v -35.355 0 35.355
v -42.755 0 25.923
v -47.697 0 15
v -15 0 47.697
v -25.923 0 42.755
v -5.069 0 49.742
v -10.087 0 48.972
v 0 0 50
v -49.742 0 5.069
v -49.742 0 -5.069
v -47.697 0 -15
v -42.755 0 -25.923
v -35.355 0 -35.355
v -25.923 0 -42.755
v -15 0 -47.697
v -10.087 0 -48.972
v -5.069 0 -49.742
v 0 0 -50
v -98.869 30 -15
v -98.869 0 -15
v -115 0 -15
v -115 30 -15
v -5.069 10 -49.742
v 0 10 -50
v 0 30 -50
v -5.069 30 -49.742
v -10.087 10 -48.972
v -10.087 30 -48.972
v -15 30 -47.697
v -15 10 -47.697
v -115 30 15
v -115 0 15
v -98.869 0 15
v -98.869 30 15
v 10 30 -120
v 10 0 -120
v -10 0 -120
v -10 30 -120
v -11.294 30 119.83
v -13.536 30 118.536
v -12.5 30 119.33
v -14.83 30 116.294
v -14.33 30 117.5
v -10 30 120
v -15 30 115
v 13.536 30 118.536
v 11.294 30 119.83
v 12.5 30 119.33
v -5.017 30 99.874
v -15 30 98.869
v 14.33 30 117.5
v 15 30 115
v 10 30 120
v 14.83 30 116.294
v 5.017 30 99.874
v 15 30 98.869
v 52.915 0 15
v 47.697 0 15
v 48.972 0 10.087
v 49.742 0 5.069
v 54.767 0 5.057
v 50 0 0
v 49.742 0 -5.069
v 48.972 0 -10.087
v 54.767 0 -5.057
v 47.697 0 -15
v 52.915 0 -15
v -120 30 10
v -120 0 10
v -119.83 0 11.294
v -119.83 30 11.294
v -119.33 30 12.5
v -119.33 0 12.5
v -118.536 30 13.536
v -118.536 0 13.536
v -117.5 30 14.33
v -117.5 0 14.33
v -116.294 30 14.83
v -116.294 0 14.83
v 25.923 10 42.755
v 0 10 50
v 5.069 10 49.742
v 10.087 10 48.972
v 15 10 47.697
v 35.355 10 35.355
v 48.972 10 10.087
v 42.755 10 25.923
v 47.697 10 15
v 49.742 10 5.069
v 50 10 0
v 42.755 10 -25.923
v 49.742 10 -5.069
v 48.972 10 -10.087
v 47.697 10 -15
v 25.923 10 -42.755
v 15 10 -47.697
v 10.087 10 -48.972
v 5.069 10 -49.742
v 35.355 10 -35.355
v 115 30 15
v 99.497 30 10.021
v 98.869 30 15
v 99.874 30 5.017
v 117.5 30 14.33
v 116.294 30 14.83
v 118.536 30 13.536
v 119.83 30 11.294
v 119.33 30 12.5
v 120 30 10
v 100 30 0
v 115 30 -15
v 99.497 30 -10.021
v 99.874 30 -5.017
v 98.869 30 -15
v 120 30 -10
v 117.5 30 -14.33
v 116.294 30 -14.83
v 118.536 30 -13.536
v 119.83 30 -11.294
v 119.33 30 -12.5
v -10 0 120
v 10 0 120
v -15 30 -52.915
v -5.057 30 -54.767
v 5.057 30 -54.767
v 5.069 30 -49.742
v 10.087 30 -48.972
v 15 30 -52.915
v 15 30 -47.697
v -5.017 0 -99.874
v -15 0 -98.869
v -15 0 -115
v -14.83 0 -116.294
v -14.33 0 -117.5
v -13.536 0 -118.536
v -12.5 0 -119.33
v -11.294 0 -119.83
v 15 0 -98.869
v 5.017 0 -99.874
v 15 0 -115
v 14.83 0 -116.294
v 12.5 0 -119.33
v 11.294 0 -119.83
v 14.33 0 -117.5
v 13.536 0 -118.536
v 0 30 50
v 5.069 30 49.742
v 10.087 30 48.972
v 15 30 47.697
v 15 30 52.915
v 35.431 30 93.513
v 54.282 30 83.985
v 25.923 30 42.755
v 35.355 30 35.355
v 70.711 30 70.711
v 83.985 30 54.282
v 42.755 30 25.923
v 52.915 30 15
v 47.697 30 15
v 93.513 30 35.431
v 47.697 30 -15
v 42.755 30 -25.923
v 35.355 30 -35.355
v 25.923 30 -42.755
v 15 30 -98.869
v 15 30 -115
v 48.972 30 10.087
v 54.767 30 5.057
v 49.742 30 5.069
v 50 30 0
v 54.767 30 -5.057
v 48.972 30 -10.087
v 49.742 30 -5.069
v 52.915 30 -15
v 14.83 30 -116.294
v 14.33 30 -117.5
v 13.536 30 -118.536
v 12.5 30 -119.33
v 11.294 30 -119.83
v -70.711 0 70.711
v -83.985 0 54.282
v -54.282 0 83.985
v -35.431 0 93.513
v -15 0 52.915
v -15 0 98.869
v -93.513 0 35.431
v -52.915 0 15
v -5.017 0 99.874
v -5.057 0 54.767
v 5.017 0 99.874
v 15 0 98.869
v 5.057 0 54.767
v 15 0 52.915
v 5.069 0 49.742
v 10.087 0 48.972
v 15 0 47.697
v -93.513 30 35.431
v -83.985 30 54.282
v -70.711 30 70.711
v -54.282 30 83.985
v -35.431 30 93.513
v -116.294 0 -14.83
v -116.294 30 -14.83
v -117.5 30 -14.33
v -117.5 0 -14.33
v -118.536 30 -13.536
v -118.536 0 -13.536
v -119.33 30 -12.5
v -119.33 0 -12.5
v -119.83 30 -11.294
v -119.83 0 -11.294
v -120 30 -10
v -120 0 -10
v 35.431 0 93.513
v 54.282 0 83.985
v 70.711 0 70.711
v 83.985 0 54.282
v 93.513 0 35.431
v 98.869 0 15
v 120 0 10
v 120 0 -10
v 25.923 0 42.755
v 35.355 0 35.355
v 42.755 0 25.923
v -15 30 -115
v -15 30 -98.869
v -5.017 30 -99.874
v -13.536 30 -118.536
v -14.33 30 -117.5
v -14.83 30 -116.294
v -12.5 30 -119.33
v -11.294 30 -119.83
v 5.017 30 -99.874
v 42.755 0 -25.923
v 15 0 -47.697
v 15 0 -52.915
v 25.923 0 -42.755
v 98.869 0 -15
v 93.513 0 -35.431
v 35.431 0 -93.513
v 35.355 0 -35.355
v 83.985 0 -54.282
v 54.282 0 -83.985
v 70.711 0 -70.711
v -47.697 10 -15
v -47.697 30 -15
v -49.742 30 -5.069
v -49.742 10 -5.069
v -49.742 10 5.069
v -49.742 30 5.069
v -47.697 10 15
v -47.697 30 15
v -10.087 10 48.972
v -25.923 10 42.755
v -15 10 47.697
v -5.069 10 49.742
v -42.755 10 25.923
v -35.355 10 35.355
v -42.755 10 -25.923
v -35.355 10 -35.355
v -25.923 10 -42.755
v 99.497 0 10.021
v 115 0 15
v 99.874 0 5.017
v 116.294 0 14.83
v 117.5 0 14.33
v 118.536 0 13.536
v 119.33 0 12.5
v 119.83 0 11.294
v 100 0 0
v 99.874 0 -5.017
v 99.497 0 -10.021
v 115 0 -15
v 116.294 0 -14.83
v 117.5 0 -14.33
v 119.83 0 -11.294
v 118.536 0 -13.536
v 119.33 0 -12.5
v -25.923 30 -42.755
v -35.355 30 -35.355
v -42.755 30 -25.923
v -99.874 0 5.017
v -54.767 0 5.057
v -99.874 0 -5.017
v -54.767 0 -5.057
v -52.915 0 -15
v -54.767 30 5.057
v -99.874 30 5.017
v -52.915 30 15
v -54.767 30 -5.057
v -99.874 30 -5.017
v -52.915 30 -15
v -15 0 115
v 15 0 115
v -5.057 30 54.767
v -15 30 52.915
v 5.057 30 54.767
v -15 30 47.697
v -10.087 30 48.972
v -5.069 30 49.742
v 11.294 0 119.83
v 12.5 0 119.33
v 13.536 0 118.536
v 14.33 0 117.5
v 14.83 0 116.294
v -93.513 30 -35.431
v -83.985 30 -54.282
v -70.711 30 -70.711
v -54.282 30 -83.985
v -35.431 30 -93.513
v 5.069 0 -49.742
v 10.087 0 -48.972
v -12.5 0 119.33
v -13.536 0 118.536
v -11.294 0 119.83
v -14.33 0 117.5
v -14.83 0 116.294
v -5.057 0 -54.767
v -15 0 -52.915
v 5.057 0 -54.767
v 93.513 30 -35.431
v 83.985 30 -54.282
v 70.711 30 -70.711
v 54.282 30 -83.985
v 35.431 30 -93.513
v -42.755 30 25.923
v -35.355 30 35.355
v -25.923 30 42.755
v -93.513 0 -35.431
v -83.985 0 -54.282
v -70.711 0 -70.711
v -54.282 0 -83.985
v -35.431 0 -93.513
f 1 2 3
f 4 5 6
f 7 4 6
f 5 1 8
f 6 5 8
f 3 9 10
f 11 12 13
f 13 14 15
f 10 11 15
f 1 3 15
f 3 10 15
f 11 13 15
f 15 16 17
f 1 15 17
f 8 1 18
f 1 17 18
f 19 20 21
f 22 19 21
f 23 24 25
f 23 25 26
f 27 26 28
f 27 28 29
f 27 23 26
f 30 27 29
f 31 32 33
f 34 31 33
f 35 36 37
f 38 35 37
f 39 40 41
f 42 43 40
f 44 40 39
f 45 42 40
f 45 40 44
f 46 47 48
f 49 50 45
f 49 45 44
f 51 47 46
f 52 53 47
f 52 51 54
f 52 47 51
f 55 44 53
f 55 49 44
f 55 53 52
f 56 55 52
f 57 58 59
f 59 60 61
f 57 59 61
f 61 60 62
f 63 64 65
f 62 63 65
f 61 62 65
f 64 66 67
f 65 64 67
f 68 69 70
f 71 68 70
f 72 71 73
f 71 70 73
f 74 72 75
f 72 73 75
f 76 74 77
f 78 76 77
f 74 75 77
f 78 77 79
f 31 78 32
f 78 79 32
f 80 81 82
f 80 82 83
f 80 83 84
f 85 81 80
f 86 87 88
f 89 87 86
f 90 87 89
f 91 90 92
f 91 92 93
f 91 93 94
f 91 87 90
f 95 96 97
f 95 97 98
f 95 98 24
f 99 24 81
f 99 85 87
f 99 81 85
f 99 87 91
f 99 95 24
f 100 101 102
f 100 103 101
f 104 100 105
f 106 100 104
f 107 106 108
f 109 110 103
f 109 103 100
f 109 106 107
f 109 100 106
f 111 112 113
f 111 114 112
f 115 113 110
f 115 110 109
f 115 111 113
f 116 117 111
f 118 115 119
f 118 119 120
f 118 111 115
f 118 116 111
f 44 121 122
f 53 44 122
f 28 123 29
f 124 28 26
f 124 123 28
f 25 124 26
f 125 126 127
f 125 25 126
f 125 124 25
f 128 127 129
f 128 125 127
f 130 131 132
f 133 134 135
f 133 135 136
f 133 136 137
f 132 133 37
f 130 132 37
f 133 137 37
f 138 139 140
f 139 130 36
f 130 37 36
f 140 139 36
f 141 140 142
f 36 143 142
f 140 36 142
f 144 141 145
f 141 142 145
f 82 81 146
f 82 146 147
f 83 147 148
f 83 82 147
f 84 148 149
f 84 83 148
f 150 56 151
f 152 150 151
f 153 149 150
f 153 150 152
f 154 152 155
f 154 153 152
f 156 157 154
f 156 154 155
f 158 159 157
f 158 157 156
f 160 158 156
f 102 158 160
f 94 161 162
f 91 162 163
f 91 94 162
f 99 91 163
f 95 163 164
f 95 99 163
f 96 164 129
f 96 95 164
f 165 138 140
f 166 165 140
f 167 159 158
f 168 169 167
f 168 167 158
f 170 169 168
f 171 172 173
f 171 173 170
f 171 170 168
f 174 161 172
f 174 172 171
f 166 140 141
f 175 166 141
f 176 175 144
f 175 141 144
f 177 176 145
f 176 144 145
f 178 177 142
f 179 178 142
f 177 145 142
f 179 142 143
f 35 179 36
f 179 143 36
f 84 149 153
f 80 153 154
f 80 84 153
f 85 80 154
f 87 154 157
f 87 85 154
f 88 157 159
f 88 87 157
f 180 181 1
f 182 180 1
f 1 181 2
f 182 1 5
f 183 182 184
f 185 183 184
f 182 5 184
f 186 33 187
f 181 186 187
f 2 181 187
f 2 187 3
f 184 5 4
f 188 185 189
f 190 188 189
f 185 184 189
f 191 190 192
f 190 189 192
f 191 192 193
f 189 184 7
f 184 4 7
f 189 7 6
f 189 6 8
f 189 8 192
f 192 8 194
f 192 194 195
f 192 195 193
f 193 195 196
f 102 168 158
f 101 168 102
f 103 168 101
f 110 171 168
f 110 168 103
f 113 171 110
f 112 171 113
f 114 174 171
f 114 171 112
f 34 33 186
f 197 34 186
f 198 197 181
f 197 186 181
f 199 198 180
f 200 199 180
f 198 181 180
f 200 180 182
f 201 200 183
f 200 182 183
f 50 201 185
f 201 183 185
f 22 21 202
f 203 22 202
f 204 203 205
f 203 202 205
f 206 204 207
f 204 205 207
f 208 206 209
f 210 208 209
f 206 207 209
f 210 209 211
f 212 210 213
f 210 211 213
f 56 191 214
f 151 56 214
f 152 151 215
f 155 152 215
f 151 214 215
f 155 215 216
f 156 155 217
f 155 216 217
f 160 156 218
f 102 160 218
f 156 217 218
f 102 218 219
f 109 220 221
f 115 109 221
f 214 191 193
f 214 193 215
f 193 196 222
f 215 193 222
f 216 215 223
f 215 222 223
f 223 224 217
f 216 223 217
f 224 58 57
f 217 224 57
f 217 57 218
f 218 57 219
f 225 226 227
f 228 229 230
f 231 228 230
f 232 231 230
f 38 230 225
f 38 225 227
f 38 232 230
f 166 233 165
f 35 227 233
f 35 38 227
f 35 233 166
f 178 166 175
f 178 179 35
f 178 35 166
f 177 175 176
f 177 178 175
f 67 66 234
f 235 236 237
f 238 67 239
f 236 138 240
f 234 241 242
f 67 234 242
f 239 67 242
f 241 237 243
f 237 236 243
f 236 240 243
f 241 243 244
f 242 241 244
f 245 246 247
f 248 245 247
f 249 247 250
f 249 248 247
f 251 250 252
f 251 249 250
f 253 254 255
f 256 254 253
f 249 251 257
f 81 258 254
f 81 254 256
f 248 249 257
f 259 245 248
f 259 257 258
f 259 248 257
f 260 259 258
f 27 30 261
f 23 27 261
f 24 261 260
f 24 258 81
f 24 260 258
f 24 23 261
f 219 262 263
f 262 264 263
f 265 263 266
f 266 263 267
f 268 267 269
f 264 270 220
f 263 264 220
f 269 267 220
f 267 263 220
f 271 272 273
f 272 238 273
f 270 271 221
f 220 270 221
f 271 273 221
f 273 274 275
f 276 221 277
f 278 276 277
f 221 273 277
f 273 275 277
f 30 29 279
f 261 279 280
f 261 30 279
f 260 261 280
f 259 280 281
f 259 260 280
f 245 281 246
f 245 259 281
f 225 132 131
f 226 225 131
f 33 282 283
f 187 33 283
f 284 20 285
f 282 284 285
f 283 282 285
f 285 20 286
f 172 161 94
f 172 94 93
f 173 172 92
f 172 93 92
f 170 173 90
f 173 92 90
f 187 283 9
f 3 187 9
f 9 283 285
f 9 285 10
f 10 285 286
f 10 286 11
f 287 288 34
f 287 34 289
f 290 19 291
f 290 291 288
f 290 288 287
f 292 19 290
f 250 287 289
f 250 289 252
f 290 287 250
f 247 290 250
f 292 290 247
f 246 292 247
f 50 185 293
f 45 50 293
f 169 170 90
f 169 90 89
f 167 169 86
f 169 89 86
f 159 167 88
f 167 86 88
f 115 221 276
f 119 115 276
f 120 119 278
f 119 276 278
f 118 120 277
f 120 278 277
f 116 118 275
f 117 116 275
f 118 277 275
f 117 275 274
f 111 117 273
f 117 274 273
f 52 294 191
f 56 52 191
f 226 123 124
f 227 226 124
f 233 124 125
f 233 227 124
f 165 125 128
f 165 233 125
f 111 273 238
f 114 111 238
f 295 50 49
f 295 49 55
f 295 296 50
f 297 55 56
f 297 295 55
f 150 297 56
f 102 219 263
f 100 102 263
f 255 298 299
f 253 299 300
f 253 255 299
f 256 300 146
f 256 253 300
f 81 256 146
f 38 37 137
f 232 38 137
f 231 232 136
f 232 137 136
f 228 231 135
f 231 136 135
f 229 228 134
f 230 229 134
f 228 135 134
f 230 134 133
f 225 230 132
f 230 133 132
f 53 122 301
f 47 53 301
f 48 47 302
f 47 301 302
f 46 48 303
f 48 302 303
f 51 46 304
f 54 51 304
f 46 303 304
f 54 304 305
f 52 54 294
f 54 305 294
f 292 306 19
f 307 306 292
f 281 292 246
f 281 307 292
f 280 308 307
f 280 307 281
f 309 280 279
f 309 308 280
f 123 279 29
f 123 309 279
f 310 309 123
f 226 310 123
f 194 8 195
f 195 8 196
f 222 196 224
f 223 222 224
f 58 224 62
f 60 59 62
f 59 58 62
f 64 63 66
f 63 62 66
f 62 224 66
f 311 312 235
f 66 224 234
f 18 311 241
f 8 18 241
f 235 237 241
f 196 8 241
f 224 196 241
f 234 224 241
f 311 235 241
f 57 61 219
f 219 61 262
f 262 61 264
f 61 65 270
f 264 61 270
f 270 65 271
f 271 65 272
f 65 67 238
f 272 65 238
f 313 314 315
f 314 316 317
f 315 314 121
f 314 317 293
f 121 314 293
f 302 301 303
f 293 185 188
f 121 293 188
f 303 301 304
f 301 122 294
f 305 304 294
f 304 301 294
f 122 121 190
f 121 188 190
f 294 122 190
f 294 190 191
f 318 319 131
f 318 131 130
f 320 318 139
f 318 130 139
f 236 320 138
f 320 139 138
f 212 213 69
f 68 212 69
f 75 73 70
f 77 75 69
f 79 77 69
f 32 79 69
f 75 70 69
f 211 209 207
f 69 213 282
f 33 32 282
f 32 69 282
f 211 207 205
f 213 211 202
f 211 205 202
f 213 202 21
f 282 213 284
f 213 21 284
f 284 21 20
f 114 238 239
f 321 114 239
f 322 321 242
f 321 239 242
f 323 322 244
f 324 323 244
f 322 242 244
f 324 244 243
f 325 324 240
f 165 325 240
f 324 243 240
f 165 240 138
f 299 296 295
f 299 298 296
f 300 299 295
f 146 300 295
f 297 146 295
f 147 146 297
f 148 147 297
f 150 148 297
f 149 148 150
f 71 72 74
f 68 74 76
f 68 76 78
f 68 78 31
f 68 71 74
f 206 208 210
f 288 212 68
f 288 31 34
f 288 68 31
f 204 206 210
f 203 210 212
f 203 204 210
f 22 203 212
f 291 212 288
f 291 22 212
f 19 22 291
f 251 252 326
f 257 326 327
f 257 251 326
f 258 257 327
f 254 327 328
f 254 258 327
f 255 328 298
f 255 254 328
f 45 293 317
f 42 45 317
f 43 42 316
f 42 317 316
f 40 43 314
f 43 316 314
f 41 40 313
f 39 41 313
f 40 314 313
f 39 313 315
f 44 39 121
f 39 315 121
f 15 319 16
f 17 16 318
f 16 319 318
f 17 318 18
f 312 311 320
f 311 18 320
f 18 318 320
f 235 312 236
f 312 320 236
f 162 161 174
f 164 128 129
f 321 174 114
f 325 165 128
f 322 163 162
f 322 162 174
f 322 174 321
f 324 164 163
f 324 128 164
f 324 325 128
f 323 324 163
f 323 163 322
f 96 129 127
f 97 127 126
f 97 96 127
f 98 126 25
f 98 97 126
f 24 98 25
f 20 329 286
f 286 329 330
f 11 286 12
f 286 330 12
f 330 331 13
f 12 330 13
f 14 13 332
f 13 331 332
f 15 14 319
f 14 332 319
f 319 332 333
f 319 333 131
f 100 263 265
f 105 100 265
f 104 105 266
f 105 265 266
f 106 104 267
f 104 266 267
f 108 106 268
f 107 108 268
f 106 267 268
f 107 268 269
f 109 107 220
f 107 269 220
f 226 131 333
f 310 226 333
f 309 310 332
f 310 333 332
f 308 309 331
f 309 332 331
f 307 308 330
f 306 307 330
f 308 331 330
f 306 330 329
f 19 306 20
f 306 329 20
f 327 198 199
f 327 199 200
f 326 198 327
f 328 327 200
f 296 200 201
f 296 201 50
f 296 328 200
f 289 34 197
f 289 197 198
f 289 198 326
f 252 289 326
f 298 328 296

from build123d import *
from build123d.topology import SkipClean

# Parameters (mm, degrees)
SKETCH1_R           = 100
SKETCH1_R_2         = 50
BOSS_EXTRUDE3_DEPTH = 30
BOSS_EXTRUDE4_DEPTH = 10


with BuildPart() as part:
    # Sketch1 → Boss-Extrude3 (new body)
    # profile 1 of 16: a face of its own
    with SkipClean():  # the faces are left unmerged after this step: merging them gives an invalid solid
        with BuildSketch(Plane(origin=(0, 0, 0), x_dir=(1, 0, 0), z_dir=(0, 1, 0))):
            Circle(SKETCH1_R)
            with Locations(Location((0, 0, 0), (0, 0, 270))):
                Circle(SKETCH1_R_2, mode=Mode.SUBTRACT)
        # profile 2 of 16: a face of its own
        with BuildSketch(Plane(origin=(0, 0, 0), x_dir=(1, 0, 0), z_dir=(0, 1, 0))):
            with BuildLine():
                ThreePointArc((-15, 52.915026221), (0, 55), (15, 52.915026221))
                Line((15, 52.915026221), (15, 98.868599666))
                ThreePointArc((15, 98.868599666), (0, 100), (-15, 98.868599666))
                Line((-15, 98.868599666), (-15, 52.915026221))
            make_face()
        # profile 3 of 16: a face of its own
        with BuildSketch(Plane(origin=(0, 0, 0), x_dir=(1, 0, 0), z_dir=(0, 1, 0))):
            with BuildLine():
                ThreePointArc((-15, 47.696960071), (-7.587884964, 49.420886291), (0, 50))
                ThreePointArc((0, 50), (7.587884964, 49.420886291), (15, 47.696960071))
                Line((15, 47.696960071), (15, 52.915026221))
                ThreePointArc((15, 52.915026221), (0, 55), (-15, 52.915026221))
                Line((-15, 52.915026221), (-15, 47.696960071))
            make_face()
        # profile 4 of 16: a face of its own
        with BuildSketch(Plane(origin=(0, 0, 0), x_dir=(1, 0, 0), z_dir=(0, 1, 0))):
            with BuildLine():
                ThreePointArc((-15, 98.868599666), (0, 100), (15, 98.868599666))
                Line((15, 98.868599666), (15, 115))
                ThreePointArc((15, 115), (13.535533906, 118.535533906), (10, 120))
                Line((10, 120), (-10, 120))
                ThreePointArc((-10, 120), (-13.535533906, 118.535533906), (-15, 115))
                Line((-15, 115), (-15, 98.868599666))
            make_face()
        # profile 5 of 16: a face of its own
        with BuildSketch(Plane(origin=(0, 0, 0), x_dir=(1, 0, 0), z_dir=(0, 1, 0))):
            with BuildLine():
                ThreePointArc((-98.868599666, -15), (-100, 0), (-98.868599666, 15))
                Line((-98.868599666, 15), (-115, 15))
                ThreePointArc((-115, 15), (-118.535533906, 13.535533906), (-120, 10))
                Line((-120, 10), (-120, -10))
                ThreePointArc((-120, -10), (-118.535533906, -13.535533906), (-115, -15))
                Line((-115, -15), (-98.868599666, -15))
            make_face()
        # profile 6 of 16: a face of its own
        with BuildSketch(Plane(origin=(0, 0, 0), x_dir=(1, 0, 0), z_dir=(0, 1, 0))):
            with BuildLine():
                ThreePointArc((-52.915026221, -15), (-55, 0), (-52.915026221, 15))
                Line((-52.915026221, 15), (-98.868599666, 15))
                ThreePointArc((-98.868599666, 15), (-100, 0), (-98.868599666, -15))
                Line((-98.868599666, -15), (-52.915026221, -15))
            make_face()
        # profile 7 of 16: a face of its own
        with BuildSketch(Plane(origin=(0, 0, 0), x_dir=(1, 0, 0), z_dir=(0, 1, 0))):
            with BuildLine():
                ThreePointArc((-47.696960071, 15), (-35.355339059, 35.355339059), (-15, 47.696960071))
                Line((-15, 47.696960071), (-15, 52.915026221))
                Line((-15, 52.915026221), (-15, 98.868599666))
                ThreePointArc((-15, 98.868599666), (-70.710678119, 70.710678119), (-98.868599666, 15))
                Line((-98.868599666, 15), (-52.915026221, 15))
                Line((-52.915026221, 15), (-47.696960071, 15))
            make_face()
        # profile 8 of 16: a face of its own
        with BuildSketch(Plane(origin=(0, 0, 0), x_dir=(1, 0, 0), z_dir=(0, 1, 0))):
            with BuildLine():
                Line((-15, -52.915026221), (-15, -47.696960071))
                ThreePointArc((-15, -47.696960071), (-35.355339059, -35.355339059), (-47.696960071, -15))
                Line((-47.696960071, -15), (-52.915026221, -15))
                Line((-52.915026221, -15), (-98.868599666, -15))
                ThreePointArc((-98.868599666, -15), (-70.710678119, -70.710678119), (-15, -98.868599666))
                Line((-15, -98.868599666), (-15, -52.915026221))
            make_face()
        # profile 9 of 16: a face of its own
        with BuildSketch(Plane(origin=(0, 0, 0), x_dir=(1, 0, 0), z_dir=(0, 1, 0))):
            with BuildLine():
                ThreePointArc((15, -52.915026221), (0, -55), (-15, -52.915026221))
                Line((-15, -52.915026221), (-15, -98.868599666))
                ThreePointArc((-15, -98.868599666), (0, -100), (15, -98.868599666))
                Line((15, -98.868599666), (15, -52.915026221))
            make_face()
        # profile 10 of 16: a face of its own
        with BuildSketch(Plane(origin=(0, 0, 0), x_dir=(1, 0, 0), z_dir=(0, 1, 0))):
            with BuildLine():
                ThreePointArc((15, -98.868599666), (0, -100), (-15, -98.868599666))
                Line((-15, -98.868599666), (-15, -115))
                ThreePointArc((-15, -115), (-13.535533906, -118.535533906), (-10, -120))
                Line((-10, -120), (10, -120))
                ThreePointArc((10, -120), (13.535533906, -118.535533906), (15, -115))
                Line((15, -115), (15, -98.868599666))
            make_face()
        # profile 11 of 16: a face of its own
        with BuildSketch(Plane(origin=(0, 0, 0), x_dir=(1, 0, 0), z_dir=(0, 1, 0))):
            with BuildLine():
                ThreePointArc((47.696960071, -15), (35.355339059, -35.355339059), (15, -47.696960071))
                Line((15, -47.696960071), (15, -52.915026221))
                Line((15, -52.915026221), (15, -98.868599666))
                ThreePointArc((15, -98.868599666), (70.710678119, -70.710678119), (98.868599666, -15))
                Line((98.868599666, -15), (52.915026221, -15))
                Line((52.915026221, -15), (47.696960071, -15))
            make_face()
        # profile 12 of 16: a face of its own
        with BuildSketch(Plane(origin=(0, 0, 0), x_dir=(1, 0, 0), z_dir=(0, 1, 0))):
            with BuildLine():
                Line((98.868599666, 15), (52.915026221, 15))
                ThreePointArc((52.915026221, 15), (55, 0), (52.915026221, -15))
                Line((52.915026221, -15), (98.868599666, -15))
                ThreePointArc((98.868599666, -15), (99.71674876, -7.521304187), (100, 0))
                ThreePointArc((100, 0), (99.71674876, 7.521304187), (98.868599666, 15))
            make_face()
        # profile 13 of 16: a face of its own
        with BuildSketch(Plane(origin=(0, 0, 0), x_dir=(1, 0, 0), z_dir=(0, 1, 0))):
            with BuildLine():
                Line((115, 15), (98.868599666, 15))
                ThreePointArc((98.868599666, 15), (99.71674876, 7.521304187), (100, 0))
                ThreePointArc((100, 0), (99.71674876, -7.521304187), (98.868599666, -15))
                Line((98.868599666, -15), (115, -15))
                ThreePointArc((115, -15), (118.535533906, -13.535533906), (120, -10))
                Line((120, -10), (120, 10))
                ThreePointArc((120, 10), (118.535533906, 13.535533906), (115, 15))
            make_face()
        # profile 14 of 16: a face of its own
        with BuildSketch(Plane(origin=(0, 0, 0), x_dir=(1, 0, 0), z_dir=(0, 1, 0))):
            with BuildLine():
                Line((15, 52.915026221), (15, 47.696960071))
                ThreePointArc((15, 47.696960071), (35.355339059, 35.355339059), (47.696960071, 15))
                Line((47.696960071, 15), (52.915026221, 15))
                Line((52.915026221, 15), (98.868599666, 15))
                ThreePointArc((98.868599666, 15), (70.710678119, 70.710678119), (15, 98.868599666))
                Line((15, 98.868599666), (15, 52.915026221))
            make_face()
        # profile 15 of 16: a face of its own
        with BuildSketch(Plane(origin=(0, 0, 0), x_dir=(1, 0, 0), z_dir=(0, 1, 0))):
            with BuildLine():
                ThreePointArc((15, -47.696960071), (7.587884964, -49.420886291), (0, -50))
                ThreePointArc((0, -50), (-7.587884964, -49.420886291), (-15, -47.696960071))
                Line((-15, -47.696960071), (-15, -52.915026221))
                ThreePointArc((-15, -52.915026221), (0, -55), (15, -52.915026221))
                Line((15, -52.915026221), (15, -47.696960071))
            make_face()
        # profile 16 of 16: a face of its own
        with BuildSketch(Plane(origin=(0, 0, 0), x_dir=(1, 0, 0), z_dir=(0, 1, 0))):
            with BuildLine():
                Line((52.915026221, 15), (47.696960071, 15))
                ThreePointArc((47.696960071, 15), (49.420886291, 7.587884964), (50, 0))
                ThreePointArc((50, 0), (49.420886291, -7.587884964), (47.696960071, -15))
                Line((47.696960071, -15), (52.915026221, -15))
                ThreePointArc((52.915026221, -15), (55, 0), (52.915026221, 15))
            make_face()
        extrude(amount=BOSS_EXTRUDE3_DEPTH)

    # Sketch1<7> → Boss-Extrude4 (add)
    with SkipClean():  # the faces are left unmerged after this step: merging them gives an invalid solid
        with BuildSketch(Plane(origin=(0, 0, 0), x_dir=(1, 0, 0), z_dir=(0, 1, 0))):
            with BuildLine():
                ThreePointArc((15, 47.696960071), (7.587884964, 49.420886291), (0, 50))
                Line((0, 50), (0, -50))
                ThreePointArc((0, -50), (7.587884964, -49.420886291), (15, -47.696960071))
                ThreePointArc((15, -47.696960071), (35.355339059, -35.355339059), (47.696960071, -15))
                ThreePointArc((47.696960071, -15), (49.420886291, -7.587884964), (50, 0))
                ThreePointArc((50, 0), (49.420886291, 7.587884964), (47.696960071, 15))
                ThreePointArc((47.696960071, 15), (35.355339059, 35.355339059), (15, 47.696960071))
            make_face()
            with BuildLine():
                Line((0, -50), (0, 50))
                ThreePointArc((0, 50), (-7.587884964, 49.420886291), (-15, 47.696960071))
                ThreePointArc((-15, 47.696960071), (-35.355339059, 35.355339059), (-47.696960071, 15))
                ThreePointArc((-47.696960071, 15), (-50, 0), (-47.696960071, -15))
                ThreePointArc((-47.696960071, -15), (-35.355339059, -35.355339059), (-15, -47.696960071))
                ThreePointArc((-15, -47.696960071), (-7.587884964, -49.420886291), (0, -50))
            make_face()
        extrude(amount=BOSS_EXTRUDE4_DEPTH)


solid = part.part
